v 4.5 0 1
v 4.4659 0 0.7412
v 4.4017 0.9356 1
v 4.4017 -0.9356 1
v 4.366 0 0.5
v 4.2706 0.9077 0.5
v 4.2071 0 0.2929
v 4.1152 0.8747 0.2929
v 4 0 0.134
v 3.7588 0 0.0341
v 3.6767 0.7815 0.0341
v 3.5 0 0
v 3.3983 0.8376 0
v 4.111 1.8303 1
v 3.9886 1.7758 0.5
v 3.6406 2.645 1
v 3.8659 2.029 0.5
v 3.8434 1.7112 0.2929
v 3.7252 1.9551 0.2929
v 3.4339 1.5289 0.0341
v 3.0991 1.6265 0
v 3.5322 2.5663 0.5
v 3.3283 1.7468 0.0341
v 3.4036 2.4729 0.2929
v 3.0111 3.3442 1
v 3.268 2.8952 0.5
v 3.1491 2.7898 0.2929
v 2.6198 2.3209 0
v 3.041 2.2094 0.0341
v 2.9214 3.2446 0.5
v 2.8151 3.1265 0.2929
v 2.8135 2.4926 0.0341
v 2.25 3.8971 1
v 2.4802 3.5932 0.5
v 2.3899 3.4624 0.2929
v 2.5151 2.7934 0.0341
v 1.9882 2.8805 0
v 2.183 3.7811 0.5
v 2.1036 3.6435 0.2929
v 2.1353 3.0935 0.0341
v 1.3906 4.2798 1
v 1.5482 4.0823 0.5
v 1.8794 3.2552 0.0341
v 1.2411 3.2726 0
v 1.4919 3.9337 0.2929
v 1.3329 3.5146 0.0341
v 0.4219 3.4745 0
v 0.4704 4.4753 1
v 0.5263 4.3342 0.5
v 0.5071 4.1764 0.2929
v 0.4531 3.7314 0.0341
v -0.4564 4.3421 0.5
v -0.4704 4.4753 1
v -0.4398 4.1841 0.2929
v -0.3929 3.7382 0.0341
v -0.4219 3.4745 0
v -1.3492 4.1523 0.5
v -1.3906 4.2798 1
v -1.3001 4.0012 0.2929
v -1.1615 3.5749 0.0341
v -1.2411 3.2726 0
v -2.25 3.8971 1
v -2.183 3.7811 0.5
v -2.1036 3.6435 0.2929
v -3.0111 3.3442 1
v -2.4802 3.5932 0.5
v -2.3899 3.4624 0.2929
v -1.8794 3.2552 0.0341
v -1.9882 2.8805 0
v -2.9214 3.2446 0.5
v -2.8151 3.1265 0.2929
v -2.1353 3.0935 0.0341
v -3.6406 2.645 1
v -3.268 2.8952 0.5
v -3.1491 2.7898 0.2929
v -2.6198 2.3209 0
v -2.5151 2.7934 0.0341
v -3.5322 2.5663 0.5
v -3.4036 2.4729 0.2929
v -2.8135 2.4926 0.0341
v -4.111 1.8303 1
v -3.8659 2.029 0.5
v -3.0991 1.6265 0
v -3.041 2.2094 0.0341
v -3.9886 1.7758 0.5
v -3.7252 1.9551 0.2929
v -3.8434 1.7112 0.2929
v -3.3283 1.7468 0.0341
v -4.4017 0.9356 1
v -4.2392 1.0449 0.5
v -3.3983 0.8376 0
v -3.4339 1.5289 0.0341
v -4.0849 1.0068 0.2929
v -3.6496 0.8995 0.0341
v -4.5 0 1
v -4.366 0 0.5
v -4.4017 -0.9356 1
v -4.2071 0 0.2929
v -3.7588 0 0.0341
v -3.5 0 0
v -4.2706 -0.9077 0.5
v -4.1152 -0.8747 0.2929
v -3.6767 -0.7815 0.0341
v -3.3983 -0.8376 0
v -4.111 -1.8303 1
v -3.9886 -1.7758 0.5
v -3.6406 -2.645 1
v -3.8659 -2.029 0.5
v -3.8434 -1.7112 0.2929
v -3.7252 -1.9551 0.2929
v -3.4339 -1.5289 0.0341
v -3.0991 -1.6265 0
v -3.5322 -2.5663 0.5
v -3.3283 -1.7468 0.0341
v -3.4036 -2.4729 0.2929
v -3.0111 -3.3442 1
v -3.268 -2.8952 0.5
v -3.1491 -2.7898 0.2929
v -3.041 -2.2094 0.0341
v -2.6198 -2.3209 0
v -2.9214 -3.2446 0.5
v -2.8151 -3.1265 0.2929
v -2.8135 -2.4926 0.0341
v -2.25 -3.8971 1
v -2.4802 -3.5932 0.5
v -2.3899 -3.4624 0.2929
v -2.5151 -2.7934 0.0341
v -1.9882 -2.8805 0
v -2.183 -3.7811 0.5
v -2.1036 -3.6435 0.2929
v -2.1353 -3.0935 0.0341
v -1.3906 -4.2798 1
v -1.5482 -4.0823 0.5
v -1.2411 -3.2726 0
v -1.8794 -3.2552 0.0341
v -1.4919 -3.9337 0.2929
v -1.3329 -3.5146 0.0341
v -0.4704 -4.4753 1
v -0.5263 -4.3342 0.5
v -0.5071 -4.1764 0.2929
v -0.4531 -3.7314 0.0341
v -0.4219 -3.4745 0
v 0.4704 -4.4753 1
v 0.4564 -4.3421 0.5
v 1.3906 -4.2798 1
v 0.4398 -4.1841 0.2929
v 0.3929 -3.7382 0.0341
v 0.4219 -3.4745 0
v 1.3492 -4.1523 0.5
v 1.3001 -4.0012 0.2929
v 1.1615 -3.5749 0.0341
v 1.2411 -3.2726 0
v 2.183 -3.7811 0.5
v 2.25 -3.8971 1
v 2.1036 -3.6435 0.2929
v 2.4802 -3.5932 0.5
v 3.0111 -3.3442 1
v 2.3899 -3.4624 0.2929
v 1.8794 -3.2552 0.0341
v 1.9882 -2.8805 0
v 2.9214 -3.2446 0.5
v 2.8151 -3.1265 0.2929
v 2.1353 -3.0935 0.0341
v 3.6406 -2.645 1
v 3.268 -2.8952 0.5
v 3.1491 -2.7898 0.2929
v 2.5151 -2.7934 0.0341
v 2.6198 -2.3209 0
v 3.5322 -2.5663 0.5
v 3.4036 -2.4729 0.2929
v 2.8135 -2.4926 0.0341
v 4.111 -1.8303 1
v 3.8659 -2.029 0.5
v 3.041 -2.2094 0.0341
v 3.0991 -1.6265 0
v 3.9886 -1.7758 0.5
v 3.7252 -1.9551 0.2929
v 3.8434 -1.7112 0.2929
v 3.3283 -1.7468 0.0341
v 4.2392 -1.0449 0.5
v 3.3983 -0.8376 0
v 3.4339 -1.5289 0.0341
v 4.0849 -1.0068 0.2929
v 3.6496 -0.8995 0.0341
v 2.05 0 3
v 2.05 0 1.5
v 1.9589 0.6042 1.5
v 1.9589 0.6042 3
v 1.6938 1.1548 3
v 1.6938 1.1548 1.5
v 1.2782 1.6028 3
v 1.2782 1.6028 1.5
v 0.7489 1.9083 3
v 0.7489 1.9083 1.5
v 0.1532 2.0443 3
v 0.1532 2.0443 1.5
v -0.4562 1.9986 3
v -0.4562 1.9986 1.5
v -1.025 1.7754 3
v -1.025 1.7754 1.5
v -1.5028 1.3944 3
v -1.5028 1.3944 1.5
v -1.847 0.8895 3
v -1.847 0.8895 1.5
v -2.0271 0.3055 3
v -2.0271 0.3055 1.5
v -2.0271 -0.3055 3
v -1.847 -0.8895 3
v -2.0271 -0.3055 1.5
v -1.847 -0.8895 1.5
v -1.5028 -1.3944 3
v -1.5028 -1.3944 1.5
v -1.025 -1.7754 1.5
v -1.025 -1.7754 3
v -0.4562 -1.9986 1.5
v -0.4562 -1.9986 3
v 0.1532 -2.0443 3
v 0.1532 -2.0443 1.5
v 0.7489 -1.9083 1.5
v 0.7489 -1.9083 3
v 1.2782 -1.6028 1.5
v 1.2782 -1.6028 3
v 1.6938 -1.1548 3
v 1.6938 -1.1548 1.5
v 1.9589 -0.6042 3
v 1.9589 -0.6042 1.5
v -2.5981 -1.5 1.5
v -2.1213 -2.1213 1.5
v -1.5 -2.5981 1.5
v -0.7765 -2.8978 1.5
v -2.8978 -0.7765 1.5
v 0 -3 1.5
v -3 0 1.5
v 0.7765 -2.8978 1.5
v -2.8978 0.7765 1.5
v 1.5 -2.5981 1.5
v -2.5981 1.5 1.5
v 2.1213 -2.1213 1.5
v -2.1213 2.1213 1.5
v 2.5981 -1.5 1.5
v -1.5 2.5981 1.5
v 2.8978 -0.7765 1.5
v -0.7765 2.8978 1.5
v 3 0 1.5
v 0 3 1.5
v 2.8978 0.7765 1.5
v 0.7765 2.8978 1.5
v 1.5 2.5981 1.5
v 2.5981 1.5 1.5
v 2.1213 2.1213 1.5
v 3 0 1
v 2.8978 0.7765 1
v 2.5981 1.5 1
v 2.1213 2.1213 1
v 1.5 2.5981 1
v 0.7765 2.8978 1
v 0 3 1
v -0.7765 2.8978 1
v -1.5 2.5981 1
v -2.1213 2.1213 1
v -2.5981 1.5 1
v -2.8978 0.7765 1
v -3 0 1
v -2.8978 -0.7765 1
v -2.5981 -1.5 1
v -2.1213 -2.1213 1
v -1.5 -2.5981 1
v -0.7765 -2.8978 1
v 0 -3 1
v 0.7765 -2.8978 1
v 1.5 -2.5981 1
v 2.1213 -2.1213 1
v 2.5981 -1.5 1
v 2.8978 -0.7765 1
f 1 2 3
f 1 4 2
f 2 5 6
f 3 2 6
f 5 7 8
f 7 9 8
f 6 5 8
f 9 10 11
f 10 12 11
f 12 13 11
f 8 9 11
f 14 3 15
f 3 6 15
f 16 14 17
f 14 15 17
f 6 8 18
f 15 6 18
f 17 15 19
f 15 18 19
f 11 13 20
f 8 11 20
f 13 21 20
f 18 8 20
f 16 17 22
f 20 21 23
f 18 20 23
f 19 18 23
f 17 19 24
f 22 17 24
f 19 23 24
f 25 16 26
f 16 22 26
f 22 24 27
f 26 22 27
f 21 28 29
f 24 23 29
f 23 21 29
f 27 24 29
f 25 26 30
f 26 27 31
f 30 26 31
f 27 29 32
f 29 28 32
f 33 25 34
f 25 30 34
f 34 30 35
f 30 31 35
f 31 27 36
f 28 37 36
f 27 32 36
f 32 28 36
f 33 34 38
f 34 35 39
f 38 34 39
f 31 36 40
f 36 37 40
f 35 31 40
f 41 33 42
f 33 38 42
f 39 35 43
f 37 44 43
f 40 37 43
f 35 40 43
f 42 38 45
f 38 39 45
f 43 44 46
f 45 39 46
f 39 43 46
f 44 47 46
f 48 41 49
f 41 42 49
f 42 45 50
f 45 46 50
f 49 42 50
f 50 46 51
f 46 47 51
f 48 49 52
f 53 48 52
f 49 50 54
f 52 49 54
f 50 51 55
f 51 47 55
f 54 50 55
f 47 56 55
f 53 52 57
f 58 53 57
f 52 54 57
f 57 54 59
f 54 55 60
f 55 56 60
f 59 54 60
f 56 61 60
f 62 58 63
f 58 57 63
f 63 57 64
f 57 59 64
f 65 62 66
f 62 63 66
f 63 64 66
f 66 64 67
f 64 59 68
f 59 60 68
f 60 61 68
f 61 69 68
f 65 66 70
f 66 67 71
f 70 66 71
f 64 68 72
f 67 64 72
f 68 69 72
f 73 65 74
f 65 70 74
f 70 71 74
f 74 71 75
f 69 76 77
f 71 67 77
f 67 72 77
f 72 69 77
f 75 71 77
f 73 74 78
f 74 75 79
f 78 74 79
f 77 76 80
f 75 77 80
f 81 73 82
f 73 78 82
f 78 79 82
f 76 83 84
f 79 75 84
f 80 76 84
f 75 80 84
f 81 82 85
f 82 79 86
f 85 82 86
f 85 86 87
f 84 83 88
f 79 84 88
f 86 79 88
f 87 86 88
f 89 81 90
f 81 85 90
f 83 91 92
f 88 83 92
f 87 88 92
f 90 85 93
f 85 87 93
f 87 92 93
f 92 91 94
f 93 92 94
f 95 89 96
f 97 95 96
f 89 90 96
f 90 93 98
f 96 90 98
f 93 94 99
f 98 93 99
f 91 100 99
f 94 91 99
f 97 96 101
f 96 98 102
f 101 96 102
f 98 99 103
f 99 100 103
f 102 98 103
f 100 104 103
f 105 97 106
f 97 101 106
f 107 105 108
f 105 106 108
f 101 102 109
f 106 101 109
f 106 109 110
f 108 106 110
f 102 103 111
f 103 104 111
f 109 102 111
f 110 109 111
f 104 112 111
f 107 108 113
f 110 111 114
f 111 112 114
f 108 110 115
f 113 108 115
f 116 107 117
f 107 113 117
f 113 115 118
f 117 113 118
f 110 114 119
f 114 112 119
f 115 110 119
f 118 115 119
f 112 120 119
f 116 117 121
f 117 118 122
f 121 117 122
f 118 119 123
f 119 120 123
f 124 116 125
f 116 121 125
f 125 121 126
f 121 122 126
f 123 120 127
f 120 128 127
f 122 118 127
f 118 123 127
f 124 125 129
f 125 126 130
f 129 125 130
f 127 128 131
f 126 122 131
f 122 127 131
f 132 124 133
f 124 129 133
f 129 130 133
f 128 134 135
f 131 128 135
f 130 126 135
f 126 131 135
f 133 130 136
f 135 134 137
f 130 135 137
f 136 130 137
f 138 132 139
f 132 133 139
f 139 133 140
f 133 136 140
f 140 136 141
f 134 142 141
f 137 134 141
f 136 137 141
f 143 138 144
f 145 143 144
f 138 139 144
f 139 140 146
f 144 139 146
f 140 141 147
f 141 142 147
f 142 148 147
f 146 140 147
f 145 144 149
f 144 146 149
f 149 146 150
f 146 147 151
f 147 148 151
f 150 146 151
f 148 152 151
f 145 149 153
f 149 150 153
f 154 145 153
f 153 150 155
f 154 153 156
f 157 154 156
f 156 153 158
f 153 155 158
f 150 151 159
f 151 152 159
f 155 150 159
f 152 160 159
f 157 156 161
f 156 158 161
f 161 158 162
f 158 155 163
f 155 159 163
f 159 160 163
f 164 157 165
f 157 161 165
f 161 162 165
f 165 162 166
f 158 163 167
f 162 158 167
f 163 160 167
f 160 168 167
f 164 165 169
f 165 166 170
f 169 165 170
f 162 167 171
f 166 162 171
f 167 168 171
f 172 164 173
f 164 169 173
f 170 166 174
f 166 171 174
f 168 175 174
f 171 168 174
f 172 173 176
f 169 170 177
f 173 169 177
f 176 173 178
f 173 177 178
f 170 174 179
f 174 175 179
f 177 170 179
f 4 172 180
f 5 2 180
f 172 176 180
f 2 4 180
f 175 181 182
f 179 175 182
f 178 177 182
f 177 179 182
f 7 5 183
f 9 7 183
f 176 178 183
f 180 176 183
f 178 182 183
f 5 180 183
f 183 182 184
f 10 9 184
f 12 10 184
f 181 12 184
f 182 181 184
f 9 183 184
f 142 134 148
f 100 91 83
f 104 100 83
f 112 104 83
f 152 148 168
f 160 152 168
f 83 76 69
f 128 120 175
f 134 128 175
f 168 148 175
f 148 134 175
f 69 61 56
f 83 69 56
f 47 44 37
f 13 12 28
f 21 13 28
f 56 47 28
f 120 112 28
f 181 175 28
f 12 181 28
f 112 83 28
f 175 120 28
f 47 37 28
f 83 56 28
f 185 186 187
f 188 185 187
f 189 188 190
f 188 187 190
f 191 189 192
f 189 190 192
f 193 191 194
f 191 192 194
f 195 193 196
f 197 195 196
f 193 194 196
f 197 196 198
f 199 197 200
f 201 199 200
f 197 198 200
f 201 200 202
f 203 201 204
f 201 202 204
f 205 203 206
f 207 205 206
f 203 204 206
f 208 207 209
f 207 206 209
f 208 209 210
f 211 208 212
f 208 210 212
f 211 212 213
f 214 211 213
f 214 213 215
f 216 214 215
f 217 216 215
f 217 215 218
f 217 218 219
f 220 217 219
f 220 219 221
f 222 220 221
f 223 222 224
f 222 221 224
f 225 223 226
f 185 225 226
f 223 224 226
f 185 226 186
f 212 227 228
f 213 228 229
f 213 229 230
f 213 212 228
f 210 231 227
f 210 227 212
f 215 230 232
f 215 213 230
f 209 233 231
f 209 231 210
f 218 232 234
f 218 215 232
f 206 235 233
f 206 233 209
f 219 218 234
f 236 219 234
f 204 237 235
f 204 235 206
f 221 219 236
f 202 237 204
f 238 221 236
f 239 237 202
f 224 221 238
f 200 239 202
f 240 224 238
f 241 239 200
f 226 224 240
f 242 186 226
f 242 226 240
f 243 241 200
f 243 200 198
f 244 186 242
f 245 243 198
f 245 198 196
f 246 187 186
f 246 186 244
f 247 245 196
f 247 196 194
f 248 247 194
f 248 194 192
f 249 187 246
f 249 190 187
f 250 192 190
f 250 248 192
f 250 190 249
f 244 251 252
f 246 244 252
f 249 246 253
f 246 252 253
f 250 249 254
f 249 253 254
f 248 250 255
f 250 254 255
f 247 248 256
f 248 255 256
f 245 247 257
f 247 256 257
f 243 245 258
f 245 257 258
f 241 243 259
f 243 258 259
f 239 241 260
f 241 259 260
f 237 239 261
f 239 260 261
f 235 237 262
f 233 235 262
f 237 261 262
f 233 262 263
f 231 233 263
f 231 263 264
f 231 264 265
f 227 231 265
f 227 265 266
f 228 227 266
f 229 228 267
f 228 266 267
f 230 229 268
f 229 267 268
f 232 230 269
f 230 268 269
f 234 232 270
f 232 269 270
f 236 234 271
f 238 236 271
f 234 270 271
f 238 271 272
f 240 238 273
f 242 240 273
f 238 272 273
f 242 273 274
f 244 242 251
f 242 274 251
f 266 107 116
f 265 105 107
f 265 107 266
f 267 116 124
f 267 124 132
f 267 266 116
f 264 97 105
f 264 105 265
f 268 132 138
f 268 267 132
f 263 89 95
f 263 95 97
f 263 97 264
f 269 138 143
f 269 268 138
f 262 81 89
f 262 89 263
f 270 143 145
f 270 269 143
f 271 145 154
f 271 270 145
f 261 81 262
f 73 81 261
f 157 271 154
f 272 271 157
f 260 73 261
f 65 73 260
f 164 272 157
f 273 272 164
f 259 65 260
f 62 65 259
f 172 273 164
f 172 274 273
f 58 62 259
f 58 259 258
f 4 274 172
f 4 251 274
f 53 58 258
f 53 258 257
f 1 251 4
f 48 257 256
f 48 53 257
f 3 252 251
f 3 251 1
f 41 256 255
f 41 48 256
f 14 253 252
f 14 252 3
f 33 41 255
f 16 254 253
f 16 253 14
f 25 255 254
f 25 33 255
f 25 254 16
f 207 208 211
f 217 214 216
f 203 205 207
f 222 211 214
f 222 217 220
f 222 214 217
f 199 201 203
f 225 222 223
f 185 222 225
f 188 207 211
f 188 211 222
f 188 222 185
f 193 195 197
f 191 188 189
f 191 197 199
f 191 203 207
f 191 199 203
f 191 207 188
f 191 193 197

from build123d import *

# Parameters (mm, degrees)
F0_R     = 4.5
F1_DEPTH = 1
F2_R     = 3
F3_DEPTH = 0.5
F4_R     = 2.05
F5_DEPTH = 1.5
F6_R     = 0.99999


# Not quite as in the source:
# - a fillet or chamfer is up to 0.001 mm smaller than in the source, because OpenCascade refuses the exact size


with BuildPart() as f1:
    # F0 (on Top) → F1 (new body)
    with BuildSketch(Plane.XY):
        Circle(F0_R)
    extrude(amount=F1_DEPTH)

    # F2 (on face) → F3 (join)
    with BuildSketch(Plane.XY.offset(1)):
        Circle(F2_R)
    extrude(amount=F3_DEPTH)

    # F4 (on face) → F5 (join)
    with BuildSketch(Plane.XY.offset(1.5)):
        Circle(F4_R)
    extrude(amount=F5_DEPTH)

    # F6 (radius 1 in the source; OpenCascade refuses exactly that, so slightly less here)
    f6_edges = [f1.edges().sort_by_distance(p)[0] for p in [
        (-4.5, 0, 0),
    ]]
    fillet(f6_edges, radius=F6_R)


solid = f1.part
